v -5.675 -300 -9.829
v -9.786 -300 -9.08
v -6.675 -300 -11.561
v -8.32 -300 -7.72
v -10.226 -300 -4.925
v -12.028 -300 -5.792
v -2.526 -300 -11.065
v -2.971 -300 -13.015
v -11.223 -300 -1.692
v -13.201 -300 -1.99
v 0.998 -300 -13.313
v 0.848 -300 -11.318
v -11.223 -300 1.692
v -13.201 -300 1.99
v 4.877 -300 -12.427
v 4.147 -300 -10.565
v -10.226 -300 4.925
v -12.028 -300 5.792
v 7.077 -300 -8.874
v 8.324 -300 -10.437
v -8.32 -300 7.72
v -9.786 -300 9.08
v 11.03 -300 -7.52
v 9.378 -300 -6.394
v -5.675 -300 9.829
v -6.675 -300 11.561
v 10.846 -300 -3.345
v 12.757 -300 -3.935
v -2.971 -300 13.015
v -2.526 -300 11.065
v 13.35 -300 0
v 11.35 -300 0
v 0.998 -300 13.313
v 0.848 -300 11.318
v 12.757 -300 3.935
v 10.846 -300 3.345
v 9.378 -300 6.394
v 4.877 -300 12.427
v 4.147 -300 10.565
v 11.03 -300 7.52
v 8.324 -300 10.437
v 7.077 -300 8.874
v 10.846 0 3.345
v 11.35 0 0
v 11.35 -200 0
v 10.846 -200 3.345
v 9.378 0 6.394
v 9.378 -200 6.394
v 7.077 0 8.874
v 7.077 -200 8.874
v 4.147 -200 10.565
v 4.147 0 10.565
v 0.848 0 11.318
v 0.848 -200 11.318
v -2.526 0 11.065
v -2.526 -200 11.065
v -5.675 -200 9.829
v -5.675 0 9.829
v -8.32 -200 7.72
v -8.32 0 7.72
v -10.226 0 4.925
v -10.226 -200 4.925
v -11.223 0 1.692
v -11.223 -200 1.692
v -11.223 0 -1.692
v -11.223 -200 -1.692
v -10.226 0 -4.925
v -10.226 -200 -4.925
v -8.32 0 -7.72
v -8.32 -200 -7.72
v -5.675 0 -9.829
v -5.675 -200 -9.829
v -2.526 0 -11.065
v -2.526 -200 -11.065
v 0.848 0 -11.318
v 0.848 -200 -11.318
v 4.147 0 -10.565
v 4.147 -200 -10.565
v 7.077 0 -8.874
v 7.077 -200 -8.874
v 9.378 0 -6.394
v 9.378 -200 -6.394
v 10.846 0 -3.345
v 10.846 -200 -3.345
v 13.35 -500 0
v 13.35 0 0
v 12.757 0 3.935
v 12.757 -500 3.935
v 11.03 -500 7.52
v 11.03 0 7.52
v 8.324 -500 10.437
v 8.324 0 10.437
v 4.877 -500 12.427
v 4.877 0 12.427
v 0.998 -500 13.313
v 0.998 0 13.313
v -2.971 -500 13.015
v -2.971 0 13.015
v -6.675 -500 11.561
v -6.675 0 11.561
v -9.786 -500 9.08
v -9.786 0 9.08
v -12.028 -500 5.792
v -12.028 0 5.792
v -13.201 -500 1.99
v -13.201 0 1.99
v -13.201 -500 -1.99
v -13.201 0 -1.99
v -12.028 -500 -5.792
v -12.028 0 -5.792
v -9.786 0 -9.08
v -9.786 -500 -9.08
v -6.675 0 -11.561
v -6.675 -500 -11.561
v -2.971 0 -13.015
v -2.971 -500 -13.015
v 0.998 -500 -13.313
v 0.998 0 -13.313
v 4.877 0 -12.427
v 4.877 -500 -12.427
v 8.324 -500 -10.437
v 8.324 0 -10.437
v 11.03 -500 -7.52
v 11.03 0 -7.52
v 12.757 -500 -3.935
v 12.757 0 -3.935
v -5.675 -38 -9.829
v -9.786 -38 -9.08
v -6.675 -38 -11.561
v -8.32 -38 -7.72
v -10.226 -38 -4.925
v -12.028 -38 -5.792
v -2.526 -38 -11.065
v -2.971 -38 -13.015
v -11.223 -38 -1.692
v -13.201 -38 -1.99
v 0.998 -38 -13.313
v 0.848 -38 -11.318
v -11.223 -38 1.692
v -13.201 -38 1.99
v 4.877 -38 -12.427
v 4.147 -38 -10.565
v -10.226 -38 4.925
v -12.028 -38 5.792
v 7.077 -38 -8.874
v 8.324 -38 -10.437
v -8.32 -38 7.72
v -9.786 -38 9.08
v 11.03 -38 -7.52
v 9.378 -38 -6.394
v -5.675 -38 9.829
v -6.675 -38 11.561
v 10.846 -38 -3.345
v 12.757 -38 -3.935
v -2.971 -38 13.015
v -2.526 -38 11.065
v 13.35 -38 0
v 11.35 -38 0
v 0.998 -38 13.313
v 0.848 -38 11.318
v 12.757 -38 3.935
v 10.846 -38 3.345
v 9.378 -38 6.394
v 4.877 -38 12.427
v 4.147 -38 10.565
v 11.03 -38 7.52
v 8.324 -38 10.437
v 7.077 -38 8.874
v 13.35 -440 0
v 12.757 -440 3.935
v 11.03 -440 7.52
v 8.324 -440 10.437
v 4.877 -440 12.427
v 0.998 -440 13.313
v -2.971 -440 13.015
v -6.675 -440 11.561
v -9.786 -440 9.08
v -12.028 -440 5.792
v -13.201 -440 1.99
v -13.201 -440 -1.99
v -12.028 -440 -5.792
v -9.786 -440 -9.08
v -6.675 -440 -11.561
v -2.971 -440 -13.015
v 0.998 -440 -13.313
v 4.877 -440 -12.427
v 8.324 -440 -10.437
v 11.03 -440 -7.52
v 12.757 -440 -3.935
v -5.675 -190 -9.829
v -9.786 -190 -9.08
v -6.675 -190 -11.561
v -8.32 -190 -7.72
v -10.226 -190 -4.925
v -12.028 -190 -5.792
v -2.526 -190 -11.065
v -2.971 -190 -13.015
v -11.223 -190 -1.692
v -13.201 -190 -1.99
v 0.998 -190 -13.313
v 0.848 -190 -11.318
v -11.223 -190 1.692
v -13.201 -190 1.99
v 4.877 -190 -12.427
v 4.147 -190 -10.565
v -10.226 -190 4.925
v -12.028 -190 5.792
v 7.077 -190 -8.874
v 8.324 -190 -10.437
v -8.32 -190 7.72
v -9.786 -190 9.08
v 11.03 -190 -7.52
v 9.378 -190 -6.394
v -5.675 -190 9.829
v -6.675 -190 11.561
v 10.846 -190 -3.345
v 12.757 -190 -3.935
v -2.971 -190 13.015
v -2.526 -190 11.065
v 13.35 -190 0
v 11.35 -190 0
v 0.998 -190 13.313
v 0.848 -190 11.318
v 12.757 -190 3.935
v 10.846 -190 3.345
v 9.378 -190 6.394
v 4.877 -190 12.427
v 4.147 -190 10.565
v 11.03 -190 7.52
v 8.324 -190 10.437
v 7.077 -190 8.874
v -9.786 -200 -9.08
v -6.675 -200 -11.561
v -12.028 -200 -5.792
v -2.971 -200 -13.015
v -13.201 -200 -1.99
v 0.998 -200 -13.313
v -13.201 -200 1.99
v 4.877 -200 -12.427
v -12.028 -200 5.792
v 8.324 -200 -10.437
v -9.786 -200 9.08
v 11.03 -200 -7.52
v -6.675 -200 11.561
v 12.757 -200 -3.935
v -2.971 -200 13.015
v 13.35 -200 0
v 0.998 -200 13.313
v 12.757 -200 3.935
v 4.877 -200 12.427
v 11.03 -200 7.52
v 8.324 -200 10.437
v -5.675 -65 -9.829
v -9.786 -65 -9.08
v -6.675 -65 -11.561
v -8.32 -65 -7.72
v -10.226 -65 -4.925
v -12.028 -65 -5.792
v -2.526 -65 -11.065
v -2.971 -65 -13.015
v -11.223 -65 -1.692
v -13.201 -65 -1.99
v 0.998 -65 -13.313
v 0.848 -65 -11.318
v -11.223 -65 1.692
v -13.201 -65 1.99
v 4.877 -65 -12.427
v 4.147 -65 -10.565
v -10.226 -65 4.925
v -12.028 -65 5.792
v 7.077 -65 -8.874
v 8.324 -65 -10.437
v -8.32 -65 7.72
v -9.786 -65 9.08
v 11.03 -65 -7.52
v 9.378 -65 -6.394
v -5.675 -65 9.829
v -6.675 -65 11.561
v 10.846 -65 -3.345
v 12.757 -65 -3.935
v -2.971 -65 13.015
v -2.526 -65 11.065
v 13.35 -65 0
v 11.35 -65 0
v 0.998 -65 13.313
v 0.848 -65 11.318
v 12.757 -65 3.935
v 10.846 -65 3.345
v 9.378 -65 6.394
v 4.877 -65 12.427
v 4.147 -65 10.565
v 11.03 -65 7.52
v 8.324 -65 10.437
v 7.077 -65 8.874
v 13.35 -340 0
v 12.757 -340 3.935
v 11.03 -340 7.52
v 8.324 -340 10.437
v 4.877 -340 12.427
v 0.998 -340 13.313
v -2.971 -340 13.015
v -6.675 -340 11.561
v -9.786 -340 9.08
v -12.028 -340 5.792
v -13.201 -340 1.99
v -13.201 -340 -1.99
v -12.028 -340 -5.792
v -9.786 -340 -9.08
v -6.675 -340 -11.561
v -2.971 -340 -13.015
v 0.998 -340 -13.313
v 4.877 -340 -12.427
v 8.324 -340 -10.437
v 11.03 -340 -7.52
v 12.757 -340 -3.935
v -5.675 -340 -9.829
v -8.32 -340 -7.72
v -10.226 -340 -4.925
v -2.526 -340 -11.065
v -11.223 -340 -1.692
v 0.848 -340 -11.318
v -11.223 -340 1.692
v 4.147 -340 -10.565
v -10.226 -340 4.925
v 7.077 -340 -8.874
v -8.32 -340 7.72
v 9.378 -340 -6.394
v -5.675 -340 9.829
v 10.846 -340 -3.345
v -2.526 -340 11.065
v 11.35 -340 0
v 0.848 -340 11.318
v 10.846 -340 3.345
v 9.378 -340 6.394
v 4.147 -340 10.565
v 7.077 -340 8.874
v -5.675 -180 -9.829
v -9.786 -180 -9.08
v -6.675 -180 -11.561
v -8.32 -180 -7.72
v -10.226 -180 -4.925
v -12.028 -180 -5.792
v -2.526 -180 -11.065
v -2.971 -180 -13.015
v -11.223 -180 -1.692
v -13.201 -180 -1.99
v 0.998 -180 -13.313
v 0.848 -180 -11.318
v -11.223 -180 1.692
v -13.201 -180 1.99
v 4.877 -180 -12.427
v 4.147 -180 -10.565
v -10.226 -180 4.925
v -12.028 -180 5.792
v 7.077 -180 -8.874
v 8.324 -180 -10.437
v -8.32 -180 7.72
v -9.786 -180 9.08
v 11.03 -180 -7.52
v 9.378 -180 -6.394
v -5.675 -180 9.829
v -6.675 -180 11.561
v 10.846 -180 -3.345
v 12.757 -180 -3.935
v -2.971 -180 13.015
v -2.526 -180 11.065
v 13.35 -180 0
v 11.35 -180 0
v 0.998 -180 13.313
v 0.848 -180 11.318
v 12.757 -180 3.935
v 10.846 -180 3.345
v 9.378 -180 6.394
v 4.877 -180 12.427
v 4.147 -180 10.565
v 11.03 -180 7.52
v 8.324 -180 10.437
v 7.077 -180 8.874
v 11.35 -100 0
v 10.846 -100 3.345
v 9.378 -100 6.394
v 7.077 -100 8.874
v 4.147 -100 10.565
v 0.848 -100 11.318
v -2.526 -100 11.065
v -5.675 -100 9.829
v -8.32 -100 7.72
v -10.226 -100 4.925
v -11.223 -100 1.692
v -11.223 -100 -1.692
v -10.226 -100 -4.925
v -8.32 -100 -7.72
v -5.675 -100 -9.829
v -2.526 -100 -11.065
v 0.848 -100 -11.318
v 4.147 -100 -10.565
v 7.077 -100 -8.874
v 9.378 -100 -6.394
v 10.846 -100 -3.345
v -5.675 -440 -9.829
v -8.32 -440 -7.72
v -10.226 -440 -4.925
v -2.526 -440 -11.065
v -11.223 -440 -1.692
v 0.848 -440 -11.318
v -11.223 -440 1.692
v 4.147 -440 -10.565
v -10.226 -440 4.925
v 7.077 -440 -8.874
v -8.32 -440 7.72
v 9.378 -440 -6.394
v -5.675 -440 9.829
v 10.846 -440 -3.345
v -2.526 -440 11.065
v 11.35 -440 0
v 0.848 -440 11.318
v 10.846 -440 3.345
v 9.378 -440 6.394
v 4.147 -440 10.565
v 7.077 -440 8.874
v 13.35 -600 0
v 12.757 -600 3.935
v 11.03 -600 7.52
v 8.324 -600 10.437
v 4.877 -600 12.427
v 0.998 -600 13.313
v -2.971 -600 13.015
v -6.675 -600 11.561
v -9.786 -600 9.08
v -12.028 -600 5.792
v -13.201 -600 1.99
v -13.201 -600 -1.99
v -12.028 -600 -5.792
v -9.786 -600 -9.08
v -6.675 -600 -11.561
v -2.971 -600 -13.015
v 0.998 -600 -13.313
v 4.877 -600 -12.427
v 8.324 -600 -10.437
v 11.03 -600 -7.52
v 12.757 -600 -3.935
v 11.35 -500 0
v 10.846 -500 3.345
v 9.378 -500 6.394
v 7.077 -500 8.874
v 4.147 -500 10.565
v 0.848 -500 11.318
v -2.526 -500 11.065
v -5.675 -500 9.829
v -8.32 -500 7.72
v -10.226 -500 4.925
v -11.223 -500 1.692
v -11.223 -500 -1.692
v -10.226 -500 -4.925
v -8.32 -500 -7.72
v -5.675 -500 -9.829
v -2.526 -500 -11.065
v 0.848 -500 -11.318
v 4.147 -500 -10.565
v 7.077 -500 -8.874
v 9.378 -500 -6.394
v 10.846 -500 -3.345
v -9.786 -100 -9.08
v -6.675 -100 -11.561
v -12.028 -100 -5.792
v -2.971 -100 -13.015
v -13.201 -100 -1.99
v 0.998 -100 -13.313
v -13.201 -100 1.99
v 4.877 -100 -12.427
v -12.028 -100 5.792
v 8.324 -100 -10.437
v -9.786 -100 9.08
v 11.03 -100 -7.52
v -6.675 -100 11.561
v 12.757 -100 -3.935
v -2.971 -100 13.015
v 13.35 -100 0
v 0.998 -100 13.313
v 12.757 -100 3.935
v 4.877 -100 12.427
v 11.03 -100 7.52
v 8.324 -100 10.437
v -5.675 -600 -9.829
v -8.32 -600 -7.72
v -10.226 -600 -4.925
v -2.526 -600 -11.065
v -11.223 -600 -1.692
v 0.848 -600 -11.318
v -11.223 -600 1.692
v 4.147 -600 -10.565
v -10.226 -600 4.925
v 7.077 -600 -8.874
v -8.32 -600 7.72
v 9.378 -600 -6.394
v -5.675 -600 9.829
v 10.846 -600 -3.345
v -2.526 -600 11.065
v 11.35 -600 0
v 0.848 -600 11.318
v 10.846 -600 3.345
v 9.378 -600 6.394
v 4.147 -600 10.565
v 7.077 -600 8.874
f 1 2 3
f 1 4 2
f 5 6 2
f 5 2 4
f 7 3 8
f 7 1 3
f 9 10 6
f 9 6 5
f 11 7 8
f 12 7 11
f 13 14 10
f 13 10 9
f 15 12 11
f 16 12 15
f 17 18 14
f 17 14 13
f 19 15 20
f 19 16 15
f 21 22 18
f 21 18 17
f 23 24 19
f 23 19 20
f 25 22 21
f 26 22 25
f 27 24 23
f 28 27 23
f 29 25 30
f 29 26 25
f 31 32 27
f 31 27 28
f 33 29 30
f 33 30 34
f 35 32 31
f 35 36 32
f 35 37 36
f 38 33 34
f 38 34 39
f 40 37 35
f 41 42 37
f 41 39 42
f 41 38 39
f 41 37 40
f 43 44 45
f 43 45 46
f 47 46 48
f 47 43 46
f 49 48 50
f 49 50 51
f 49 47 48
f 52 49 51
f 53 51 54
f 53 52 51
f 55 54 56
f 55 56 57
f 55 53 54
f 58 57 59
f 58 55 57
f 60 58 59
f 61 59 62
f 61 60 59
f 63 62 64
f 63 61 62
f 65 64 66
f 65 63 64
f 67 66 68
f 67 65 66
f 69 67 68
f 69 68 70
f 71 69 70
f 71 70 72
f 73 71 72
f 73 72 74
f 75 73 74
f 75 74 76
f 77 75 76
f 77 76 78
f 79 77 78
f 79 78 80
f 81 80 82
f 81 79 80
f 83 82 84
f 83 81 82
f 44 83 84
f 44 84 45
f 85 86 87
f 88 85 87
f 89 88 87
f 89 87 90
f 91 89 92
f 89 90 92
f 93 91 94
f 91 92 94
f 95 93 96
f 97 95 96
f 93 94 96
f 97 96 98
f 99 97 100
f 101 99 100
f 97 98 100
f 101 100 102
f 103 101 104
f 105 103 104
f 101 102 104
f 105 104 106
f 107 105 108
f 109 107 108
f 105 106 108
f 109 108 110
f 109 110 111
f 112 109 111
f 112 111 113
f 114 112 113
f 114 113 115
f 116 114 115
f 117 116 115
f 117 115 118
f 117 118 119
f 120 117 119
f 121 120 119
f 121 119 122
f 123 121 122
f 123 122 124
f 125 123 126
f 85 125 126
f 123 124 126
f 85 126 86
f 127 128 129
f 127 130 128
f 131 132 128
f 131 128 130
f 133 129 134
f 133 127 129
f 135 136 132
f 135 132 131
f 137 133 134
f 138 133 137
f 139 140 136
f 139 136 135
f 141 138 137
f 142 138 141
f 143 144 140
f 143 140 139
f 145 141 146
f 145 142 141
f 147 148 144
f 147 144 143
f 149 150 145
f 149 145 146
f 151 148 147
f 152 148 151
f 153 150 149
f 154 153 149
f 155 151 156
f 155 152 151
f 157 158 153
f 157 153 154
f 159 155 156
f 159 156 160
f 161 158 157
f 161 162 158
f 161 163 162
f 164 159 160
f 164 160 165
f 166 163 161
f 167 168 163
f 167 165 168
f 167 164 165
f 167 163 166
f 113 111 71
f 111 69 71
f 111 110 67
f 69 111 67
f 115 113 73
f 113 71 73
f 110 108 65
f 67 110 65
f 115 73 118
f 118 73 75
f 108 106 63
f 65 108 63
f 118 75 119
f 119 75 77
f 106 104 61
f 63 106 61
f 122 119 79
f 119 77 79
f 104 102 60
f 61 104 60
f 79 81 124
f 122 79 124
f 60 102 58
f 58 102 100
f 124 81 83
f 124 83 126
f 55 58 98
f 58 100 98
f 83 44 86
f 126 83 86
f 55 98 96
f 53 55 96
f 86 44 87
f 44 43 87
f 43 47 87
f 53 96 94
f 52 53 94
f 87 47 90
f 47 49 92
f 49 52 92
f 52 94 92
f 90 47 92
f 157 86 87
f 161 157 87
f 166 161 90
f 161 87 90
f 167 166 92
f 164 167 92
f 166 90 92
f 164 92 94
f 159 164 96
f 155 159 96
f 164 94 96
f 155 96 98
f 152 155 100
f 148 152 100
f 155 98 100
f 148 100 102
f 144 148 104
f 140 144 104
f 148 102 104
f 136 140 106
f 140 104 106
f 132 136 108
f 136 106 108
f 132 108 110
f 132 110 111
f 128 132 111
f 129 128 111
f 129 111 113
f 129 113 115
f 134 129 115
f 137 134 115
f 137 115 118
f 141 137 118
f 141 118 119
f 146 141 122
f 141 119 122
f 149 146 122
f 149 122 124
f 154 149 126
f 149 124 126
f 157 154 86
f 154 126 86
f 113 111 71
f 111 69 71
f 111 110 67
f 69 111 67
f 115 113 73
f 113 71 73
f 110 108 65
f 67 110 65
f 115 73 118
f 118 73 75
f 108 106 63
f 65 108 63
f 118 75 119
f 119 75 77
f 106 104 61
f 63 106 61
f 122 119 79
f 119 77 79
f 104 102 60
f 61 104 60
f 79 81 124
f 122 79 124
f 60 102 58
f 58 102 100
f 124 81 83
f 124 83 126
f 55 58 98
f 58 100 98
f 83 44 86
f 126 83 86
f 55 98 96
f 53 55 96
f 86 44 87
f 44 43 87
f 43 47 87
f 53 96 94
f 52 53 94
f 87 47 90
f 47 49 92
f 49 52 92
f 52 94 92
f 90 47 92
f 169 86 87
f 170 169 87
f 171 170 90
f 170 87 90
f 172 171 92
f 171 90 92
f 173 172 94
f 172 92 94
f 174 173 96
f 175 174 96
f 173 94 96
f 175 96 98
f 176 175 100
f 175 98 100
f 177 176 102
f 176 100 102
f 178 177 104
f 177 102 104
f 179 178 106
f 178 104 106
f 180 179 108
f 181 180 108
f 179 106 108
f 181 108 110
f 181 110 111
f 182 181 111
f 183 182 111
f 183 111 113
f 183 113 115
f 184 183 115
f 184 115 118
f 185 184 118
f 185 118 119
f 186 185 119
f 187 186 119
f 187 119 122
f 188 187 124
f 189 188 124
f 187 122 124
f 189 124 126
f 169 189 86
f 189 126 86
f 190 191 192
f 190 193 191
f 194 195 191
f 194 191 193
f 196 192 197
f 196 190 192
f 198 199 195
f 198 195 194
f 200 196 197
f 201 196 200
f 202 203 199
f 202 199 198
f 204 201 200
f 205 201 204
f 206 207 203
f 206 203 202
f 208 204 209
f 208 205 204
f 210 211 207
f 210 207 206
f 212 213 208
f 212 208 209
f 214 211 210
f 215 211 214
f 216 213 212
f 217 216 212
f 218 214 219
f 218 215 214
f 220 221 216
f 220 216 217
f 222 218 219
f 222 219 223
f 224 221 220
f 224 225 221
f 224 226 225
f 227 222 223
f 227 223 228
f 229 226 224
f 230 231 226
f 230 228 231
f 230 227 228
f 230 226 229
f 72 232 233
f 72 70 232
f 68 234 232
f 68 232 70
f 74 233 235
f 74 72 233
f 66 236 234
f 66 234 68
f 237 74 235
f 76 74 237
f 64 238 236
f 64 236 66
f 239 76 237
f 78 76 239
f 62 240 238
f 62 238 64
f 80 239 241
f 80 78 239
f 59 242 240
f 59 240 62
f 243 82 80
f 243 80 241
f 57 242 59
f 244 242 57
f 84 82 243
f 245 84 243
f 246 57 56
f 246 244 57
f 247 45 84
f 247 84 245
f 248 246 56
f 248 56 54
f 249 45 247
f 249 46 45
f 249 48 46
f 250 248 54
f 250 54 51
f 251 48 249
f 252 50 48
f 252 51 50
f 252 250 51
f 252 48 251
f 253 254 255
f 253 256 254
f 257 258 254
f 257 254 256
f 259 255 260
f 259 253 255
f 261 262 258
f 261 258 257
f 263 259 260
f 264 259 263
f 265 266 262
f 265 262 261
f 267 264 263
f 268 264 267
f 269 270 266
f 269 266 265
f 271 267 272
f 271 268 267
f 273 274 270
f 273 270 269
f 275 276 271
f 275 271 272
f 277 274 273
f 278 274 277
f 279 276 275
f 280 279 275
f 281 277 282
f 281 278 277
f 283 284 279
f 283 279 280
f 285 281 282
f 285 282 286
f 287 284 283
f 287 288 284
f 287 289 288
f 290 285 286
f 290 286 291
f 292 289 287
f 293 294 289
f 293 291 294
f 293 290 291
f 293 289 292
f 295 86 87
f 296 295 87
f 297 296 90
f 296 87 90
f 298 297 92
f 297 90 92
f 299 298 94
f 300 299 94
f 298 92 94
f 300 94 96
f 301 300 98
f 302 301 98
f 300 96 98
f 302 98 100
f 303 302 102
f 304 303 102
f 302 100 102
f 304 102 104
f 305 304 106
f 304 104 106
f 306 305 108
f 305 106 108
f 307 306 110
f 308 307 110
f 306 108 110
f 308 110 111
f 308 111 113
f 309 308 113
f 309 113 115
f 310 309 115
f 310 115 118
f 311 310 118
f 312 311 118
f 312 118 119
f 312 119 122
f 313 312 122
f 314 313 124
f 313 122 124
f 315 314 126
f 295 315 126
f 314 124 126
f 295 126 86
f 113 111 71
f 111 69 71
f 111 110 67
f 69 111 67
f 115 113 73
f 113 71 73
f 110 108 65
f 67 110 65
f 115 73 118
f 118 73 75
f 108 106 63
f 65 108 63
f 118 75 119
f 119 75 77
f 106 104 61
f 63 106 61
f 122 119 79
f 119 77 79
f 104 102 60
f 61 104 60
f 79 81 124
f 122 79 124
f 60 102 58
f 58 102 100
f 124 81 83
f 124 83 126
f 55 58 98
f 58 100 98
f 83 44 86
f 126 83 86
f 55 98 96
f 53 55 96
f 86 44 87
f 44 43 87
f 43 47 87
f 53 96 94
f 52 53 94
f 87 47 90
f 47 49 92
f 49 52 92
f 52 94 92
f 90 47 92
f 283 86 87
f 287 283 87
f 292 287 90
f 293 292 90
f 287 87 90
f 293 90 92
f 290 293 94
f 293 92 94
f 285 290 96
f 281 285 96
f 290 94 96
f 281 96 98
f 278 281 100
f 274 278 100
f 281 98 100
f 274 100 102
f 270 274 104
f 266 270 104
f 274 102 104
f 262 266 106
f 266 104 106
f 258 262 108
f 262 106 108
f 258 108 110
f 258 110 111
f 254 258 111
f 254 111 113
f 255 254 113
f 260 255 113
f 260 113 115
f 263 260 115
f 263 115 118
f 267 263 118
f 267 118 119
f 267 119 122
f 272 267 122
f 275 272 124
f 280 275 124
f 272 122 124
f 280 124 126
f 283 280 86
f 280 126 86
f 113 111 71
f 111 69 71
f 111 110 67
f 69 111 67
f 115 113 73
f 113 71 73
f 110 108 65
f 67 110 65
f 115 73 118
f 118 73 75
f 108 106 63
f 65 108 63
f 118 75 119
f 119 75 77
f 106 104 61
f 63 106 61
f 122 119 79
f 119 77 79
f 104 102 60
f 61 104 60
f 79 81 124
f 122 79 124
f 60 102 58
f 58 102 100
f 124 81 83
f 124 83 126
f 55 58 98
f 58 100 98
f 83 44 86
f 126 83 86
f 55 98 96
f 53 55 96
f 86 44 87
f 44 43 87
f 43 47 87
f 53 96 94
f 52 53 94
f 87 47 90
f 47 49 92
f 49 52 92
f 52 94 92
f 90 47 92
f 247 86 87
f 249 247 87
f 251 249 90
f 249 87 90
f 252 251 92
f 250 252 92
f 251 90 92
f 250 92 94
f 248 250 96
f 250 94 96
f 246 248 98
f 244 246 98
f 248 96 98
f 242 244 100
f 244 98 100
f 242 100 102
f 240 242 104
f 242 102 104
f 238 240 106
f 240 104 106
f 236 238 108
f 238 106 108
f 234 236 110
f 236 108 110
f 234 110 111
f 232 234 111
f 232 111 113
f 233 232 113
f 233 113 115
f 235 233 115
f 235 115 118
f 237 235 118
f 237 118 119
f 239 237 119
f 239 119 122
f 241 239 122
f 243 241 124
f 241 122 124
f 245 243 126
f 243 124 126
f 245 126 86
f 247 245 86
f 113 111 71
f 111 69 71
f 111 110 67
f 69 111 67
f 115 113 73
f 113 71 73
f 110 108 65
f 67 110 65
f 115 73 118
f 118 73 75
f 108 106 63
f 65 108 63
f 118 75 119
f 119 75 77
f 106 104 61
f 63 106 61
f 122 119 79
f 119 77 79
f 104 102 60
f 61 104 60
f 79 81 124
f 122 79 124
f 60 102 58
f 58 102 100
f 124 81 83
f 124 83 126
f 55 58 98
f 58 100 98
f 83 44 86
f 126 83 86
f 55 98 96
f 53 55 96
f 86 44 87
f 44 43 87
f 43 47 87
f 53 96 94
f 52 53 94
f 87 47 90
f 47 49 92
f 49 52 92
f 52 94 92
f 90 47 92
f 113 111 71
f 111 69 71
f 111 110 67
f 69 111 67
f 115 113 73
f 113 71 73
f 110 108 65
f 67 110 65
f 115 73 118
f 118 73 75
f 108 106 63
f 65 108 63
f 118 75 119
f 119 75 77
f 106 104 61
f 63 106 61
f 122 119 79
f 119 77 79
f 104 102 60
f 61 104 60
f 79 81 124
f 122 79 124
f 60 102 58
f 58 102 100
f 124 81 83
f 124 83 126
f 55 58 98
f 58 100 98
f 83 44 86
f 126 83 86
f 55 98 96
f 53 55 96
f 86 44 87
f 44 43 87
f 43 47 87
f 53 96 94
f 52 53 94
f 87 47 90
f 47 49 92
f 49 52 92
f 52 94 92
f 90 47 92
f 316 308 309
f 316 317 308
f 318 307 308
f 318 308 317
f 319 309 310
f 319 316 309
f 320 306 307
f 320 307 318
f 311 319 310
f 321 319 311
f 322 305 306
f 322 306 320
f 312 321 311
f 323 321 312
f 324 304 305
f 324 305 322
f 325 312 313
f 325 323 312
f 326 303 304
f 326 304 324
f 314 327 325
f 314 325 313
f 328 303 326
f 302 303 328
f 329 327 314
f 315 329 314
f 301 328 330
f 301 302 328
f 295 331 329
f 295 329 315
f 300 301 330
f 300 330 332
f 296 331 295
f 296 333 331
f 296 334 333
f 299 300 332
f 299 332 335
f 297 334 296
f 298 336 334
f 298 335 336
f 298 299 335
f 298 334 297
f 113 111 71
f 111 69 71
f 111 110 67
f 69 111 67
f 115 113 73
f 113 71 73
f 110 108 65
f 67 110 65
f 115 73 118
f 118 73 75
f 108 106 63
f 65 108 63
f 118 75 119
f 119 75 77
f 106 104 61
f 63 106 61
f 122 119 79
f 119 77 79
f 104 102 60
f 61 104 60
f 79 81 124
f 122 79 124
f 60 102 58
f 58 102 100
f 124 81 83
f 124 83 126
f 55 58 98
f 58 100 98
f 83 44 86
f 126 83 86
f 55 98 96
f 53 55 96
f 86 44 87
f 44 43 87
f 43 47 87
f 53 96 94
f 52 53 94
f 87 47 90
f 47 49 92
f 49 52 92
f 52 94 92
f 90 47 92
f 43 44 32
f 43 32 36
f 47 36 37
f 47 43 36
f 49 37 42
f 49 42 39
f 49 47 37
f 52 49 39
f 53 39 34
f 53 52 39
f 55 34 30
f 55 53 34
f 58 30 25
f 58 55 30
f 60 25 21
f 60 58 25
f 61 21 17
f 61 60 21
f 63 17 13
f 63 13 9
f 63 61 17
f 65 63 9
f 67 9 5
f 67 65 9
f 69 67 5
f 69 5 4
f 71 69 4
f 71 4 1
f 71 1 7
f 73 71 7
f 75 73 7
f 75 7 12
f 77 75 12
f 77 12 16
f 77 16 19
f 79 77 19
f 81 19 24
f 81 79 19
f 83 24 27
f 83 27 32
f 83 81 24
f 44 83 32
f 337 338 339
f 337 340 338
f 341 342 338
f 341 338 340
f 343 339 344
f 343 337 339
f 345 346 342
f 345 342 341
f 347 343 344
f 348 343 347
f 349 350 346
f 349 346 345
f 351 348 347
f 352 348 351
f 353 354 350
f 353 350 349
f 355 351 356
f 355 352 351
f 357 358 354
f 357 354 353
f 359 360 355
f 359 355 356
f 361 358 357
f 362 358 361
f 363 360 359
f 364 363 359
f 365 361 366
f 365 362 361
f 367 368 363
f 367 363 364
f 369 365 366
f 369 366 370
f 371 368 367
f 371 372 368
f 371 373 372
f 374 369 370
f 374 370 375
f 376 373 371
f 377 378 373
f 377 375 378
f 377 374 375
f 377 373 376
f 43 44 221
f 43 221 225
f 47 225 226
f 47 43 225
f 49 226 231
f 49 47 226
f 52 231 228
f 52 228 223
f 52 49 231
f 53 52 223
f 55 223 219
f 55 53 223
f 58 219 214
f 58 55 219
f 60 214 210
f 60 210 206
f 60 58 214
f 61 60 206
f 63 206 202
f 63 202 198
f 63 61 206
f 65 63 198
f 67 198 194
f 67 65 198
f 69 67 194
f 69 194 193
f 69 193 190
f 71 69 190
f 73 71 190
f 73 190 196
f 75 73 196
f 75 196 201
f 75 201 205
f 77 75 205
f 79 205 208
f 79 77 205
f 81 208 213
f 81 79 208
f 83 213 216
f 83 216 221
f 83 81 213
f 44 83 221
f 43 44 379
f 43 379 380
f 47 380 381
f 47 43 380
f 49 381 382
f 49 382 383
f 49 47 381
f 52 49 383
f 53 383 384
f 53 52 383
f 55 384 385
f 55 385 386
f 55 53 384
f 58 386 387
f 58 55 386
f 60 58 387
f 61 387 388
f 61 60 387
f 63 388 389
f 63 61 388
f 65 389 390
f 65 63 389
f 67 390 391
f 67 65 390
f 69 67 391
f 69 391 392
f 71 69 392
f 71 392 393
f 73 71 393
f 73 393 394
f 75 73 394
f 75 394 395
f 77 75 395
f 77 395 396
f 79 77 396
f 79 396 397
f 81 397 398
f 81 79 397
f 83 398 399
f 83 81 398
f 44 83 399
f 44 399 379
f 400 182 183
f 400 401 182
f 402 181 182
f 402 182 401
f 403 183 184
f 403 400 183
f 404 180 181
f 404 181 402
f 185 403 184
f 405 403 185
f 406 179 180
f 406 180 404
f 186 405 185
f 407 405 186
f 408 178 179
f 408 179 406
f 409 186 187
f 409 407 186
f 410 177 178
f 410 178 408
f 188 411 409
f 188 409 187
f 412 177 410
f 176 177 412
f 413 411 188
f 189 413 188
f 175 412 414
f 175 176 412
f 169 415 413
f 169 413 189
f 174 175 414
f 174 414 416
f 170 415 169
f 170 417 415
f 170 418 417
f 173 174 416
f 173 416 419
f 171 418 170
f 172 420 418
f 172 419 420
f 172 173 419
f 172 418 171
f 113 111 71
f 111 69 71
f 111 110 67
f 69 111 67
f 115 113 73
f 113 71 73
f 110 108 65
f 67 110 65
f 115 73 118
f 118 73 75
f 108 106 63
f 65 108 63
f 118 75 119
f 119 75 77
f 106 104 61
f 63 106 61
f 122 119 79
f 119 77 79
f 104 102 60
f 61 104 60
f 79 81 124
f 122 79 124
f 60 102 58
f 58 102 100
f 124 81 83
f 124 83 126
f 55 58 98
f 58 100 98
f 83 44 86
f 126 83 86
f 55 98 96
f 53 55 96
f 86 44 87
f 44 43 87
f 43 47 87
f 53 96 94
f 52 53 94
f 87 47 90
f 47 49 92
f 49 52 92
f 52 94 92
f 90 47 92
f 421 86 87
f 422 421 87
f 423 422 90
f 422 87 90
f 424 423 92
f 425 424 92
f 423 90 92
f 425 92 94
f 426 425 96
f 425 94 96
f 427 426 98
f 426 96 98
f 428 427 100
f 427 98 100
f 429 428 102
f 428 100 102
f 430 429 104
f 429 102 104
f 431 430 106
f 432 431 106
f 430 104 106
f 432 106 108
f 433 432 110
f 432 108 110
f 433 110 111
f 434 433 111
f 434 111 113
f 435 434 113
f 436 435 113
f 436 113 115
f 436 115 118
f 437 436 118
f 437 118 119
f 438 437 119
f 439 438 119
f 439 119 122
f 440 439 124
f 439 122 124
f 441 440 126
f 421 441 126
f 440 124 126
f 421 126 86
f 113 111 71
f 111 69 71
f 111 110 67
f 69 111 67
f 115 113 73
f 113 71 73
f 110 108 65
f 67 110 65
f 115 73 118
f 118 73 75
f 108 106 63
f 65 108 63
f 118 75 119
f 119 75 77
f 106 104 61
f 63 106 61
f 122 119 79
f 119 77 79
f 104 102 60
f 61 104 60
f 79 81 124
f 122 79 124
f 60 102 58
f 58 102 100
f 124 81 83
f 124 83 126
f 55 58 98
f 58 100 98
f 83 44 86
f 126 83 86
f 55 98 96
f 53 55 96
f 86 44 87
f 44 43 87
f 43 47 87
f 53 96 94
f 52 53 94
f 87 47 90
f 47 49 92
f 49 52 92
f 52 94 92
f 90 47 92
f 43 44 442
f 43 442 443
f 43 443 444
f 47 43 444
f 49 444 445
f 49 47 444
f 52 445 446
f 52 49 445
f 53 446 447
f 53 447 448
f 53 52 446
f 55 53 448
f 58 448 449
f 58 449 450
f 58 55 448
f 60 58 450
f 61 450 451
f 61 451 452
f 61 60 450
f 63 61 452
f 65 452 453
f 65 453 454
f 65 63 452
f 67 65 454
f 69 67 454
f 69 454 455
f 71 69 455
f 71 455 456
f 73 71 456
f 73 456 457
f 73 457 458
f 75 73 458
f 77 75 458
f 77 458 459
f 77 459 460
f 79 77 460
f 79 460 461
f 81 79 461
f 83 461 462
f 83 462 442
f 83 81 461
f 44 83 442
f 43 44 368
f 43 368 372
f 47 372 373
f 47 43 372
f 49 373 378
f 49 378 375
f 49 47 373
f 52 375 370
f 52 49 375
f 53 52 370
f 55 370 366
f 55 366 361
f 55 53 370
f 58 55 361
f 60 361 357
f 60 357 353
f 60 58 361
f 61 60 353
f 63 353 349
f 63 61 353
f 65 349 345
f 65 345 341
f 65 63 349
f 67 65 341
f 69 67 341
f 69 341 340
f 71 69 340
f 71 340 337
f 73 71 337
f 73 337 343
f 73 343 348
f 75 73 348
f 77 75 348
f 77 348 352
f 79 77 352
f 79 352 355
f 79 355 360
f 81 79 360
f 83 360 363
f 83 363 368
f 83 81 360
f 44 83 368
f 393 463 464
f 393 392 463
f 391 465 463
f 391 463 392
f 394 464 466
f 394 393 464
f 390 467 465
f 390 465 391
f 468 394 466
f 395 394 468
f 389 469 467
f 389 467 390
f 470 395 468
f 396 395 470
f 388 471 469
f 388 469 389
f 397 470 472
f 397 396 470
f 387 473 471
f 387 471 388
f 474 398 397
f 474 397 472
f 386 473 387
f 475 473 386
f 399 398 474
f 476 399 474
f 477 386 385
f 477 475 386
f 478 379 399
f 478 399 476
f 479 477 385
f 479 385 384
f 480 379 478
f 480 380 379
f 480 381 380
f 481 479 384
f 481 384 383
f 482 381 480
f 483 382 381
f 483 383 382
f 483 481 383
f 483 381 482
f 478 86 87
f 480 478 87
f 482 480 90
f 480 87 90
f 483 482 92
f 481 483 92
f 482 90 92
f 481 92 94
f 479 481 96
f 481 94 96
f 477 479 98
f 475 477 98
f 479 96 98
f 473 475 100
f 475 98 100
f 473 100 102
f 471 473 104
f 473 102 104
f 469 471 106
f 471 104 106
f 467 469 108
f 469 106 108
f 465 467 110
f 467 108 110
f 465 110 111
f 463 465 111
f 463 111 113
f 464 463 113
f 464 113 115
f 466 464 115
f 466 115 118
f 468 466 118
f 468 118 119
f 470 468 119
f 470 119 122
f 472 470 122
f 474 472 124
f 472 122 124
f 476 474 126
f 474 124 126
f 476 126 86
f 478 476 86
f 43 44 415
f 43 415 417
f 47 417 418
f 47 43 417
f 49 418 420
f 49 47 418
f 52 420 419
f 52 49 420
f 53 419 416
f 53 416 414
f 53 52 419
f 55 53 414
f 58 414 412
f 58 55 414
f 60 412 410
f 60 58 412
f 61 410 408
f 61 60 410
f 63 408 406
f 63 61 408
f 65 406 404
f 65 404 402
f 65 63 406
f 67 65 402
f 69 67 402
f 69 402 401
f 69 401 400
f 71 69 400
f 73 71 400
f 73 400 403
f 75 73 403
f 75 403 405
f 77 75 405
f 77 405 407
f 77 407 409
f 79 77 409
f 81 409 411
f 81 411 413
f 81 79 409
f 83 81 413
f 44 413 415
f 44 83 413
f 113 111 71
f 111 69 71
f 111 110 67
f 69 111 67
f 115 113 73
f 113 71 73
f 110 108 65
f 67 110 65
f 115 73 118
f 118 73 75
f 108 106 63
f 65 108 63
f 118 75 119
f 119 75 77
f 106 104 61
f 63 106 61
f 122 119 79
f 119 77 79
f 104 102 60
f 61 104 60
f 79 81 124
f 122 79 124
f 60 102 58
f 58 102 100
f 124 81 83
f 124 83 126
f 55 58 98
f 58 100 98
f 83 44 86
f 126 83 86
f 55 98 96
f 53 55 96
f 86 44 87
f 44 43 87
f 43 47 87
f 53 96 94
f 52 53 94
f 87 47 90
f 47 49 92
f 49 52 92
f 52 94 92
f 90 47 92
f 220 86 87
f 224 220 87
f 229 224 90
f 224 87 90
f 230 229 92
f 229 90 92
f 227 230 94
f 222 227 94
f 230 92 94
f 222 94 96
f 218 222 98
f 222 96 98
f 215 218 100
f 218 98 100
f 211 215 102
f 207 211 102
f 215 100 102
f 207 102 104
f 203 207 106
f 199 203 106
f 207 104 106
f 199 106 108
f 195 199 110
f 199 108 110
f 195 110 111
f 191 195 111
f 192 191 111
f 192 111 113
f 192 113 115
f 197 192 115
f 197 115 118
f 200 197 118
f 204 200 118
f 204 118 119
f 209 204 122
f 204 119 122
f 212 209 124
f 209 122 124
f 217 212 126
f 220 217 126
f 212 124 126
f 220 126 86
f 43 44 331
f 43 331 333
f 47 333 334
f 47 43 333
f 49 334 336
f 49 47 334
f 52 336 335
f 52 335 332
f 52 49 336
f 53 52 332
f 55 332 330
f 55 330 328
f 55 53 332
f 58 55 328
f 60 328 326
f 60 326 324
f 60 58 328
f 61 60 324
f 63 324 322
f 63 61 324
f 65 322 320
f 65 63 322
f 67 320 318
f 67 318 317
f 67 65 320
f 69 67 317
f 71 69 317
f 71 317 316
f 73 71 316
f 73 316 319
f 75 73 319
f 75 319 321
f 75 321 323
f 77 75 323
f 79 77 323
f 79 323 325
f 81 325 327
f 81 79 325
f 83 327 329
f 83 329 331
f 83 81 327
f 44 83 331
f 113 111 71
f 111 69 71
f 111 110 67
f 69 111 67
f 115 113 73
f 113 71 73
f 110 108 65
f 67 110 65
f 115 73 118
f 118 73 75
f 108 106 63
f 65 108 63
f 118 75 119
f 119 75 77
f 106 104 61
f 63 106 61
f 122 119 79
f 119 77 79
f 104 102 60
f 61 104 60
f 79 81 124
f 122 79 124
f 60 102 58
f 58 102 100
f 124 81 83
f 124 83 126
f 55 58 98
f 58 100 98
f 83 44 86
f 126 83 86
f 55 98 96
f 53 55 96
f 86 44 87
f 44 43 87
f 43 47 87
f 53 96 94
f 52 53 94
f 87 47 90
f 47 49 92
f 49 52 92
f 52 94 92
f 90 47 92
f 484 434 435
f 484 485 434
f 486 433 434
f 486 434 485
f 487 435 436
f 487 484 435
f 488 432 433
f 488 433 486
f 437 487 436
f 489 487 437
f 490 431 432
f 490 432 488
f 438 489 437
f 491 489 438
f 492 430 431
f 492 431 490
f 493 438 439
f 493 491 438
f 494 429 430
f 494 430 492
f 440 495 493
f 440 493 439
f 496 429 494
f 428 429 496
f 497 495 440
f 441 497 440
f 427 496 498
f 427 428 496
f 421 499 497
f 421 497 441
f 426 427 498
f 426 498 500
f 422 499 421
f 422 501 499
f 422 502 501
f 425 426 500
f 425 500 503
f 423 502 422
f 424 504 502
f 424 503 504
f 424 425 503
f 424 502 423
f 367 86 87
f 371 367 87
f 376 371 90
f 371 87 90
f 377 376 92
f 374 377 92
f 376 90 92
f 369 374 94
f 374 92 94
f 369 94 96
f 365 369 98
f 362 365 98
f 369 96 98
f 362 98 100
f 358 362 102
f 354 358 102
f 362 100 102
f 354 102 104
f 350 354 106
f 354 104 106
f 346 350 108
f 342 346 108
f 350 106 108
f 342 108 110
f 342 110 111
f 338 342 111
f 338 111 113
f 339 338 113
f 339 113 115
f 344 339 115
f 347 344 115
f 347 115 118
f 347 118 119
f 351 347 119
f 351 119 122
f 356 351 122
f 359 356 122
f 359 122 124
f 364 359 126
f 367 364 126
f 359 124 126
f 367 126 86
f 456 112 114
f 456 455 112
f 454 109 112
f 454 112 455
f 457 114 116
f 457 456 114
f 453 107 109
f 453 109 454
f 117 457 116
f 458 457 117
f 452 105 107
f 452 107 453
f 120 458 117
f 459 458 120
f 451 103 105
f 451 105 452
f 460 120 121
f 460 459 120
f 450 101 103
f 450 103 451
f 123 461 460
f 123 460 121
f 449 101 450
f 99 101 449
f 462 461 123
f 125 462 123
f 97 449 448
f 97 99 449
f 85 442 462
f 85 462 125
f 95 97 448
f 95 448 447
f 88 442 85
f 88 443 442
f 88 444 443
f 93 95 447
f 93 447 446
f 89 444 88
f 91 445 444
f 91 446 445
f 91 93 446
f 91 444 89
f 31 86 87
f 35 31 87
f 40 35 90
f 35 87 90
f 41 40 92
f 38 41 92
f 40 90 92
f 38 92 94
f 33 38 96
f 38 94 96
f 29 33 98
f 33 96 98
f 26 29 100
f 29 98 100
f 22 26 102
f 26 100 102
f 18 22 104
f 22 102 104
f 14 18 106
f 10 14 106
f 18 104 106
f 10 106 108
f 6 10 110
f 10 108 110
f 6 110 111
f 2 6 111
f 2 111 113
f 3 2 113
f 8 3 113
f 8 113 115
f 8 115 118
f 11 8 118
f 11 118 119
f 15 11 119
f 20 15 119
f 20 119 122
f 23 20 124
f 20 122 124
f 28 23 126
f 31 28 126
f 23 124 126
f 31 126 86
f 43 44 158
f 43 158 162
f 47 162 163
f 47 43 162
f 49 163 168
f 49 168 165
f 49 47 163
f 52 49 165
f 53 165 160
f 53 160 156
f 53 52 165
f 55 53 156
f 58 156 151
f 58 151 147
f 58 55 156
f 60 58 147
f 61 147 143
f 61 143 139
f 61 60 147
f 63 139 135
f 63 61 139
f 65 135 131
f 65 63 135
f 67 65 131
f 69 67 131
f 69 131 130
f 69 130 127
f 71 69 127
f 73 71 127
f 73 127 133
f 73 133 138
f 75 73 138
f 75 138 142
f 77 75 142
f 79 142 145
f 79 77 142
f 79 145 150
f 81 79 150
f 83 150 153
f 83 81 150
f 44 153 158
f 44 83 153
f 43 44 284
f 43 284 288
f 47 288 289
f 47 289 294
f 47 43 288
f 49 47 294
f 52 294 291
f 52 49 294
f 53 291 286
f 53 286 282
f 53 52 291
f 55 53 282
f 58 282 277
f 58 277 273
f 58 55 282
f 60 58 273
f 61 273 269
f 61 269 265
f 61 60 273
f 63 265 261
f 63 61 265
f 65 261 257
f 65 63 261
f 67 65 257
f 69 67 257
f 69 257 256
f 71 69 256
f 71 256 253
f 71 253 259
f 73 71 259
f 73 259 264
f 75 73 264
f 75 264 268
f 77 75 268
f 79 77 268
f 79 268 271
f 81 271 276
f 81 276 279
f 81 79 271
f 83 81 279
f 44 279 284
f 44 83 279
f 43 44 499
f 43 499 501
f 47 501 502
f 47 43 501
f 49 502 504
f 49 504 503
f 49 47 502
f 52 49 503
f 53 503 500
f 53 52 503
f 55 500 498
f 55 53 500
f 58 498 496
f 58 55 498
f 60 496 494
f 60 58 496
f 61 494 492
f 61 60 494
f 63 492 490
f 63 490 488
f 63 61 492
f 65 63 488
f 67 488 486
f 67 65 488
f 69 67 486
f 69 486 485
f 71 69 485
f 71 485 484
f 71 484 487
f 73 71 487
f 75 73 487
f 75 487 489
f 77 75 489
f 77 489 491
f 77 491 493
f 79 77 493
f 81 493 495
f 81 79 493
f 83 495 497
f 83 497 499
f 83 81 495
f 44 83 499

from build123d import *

# Parameters (mm, degrees)
F0_R      = 13.35
F0_R_2    = 11.35
F1_DEPTH  = 500
F2_DEPTH  = 300
F3_DEPTH  = 38
F4_DEPTH  = 600
F5_DEPTH  = 100
F6_DEPTH  = 65
F7_DEPTH  = 200
F8_DEPTH  = 440
F9_DEPTH  = 180
F10_DEPTH = 190
F11_DEPTH = 340


with BuildPart() as f1:
    # F0 (on Front) → F1 (new body)
    with BuildSketch(Plane.XZ):
        Circle(F0_R)
        Circle(F0_R_2, mode=Mode.SUBTRACT)
    extrude(amount=F1_DEPTH)


with BuildPart() as f2:
    # F0 (on Front) → F2 (new body)
    with BuildSketch(Plane.XZ):
        Circle(F0_R)
        Circle(F0_R_2, mode=Mode.SUBTRACT)
    extrude(amount=F2_DEPTH)


with BuildPart() as f3:
    # F0 (on Front) → F3 (new body)
    with BuildSketch(Plane.XZ):
        Circle(F0_R)
        Circle(F0_R_2, mode=Mode.SUBTRACT)
    extrude(amount=F3_DEPTH)


with BuildPart() as f4:
    # F0 (on Front) → F4 (new body)
    with BuildSketch(Plane.XZ):
        Circle(F0_R)
        Circle(F0_R_2, mode=Mode.SUBTRACT)
    extrude(amount=F4_DEPTH)


with BuildPart() as f5:
    # F0 (on Front) → F5 (new body)
    with BuildSketch(Plane.XZ):
        Circle(F0_R)
        Circle(F0_R_2, mode=Mode.SUBTRACT)
    extrude(amount=F5_DEPTH)


with BuildPart() as f6:
    # F0 (on Front) → F6 (new body)
    with BuildSketch(Plane.XZ):
        Circle(F0_R)
        Circle(F0_R_2, mode=Mode.SUBTRACT)
    extrude(amount=F6_DEPTH)


with BuildPart() as f7:
    # F0 (on Front) → F7 (new body)
    with BuildSketch(Plane.XZ):
        Circle(F0_R)
        Circle(F0_R_2, mode=Mode.SUBTRACT)
    extrude(amount=F7_DEPTH)


with BuildPart() as f8:
    # F0 (on Front) → F8 (new body)
    with BuildSketch(Plane.XZ):
        Circle(F0_R)
        Circle(F0_R_2, mode=Mode.SUBTRACT)
    extrude(amount=F8_DEPTH)


with BuildPart() as f9:
    # F0 (on Front) → F9 (new body)
    with BuildSketch(Plane.XZ):
        Circle(F0_R)
        Circle(F0_R_2, mode=Mode.SUBTRACT)
    extrude(amount=F9_DEPTH)


with BuildPart() as f10:
    # F0 (on Front) → F10 (new body)
    with BuildSketch(Plane.XZ):
        Circle(F0_R)
        Circle(F0_R_2, mode=Mode.SUBTRACT)
    extrude(amount=F10_DEPTH)


with BuildPart() as f11:
    # F0 (on Front) → F11 (new body)
    with BuildSketch(Plane.XZ):
        Circle(F0_R)
        Circle(F0_R_2, mode=Mode.SUBTRACT)
    extrude(amount=F11_DEPTH)


solid = Compound([f1.part, f2.part, f3.part, f4.part, f5.part, f6.part, f7.part, f8.part, f9.part, f10.part, f11.part])
